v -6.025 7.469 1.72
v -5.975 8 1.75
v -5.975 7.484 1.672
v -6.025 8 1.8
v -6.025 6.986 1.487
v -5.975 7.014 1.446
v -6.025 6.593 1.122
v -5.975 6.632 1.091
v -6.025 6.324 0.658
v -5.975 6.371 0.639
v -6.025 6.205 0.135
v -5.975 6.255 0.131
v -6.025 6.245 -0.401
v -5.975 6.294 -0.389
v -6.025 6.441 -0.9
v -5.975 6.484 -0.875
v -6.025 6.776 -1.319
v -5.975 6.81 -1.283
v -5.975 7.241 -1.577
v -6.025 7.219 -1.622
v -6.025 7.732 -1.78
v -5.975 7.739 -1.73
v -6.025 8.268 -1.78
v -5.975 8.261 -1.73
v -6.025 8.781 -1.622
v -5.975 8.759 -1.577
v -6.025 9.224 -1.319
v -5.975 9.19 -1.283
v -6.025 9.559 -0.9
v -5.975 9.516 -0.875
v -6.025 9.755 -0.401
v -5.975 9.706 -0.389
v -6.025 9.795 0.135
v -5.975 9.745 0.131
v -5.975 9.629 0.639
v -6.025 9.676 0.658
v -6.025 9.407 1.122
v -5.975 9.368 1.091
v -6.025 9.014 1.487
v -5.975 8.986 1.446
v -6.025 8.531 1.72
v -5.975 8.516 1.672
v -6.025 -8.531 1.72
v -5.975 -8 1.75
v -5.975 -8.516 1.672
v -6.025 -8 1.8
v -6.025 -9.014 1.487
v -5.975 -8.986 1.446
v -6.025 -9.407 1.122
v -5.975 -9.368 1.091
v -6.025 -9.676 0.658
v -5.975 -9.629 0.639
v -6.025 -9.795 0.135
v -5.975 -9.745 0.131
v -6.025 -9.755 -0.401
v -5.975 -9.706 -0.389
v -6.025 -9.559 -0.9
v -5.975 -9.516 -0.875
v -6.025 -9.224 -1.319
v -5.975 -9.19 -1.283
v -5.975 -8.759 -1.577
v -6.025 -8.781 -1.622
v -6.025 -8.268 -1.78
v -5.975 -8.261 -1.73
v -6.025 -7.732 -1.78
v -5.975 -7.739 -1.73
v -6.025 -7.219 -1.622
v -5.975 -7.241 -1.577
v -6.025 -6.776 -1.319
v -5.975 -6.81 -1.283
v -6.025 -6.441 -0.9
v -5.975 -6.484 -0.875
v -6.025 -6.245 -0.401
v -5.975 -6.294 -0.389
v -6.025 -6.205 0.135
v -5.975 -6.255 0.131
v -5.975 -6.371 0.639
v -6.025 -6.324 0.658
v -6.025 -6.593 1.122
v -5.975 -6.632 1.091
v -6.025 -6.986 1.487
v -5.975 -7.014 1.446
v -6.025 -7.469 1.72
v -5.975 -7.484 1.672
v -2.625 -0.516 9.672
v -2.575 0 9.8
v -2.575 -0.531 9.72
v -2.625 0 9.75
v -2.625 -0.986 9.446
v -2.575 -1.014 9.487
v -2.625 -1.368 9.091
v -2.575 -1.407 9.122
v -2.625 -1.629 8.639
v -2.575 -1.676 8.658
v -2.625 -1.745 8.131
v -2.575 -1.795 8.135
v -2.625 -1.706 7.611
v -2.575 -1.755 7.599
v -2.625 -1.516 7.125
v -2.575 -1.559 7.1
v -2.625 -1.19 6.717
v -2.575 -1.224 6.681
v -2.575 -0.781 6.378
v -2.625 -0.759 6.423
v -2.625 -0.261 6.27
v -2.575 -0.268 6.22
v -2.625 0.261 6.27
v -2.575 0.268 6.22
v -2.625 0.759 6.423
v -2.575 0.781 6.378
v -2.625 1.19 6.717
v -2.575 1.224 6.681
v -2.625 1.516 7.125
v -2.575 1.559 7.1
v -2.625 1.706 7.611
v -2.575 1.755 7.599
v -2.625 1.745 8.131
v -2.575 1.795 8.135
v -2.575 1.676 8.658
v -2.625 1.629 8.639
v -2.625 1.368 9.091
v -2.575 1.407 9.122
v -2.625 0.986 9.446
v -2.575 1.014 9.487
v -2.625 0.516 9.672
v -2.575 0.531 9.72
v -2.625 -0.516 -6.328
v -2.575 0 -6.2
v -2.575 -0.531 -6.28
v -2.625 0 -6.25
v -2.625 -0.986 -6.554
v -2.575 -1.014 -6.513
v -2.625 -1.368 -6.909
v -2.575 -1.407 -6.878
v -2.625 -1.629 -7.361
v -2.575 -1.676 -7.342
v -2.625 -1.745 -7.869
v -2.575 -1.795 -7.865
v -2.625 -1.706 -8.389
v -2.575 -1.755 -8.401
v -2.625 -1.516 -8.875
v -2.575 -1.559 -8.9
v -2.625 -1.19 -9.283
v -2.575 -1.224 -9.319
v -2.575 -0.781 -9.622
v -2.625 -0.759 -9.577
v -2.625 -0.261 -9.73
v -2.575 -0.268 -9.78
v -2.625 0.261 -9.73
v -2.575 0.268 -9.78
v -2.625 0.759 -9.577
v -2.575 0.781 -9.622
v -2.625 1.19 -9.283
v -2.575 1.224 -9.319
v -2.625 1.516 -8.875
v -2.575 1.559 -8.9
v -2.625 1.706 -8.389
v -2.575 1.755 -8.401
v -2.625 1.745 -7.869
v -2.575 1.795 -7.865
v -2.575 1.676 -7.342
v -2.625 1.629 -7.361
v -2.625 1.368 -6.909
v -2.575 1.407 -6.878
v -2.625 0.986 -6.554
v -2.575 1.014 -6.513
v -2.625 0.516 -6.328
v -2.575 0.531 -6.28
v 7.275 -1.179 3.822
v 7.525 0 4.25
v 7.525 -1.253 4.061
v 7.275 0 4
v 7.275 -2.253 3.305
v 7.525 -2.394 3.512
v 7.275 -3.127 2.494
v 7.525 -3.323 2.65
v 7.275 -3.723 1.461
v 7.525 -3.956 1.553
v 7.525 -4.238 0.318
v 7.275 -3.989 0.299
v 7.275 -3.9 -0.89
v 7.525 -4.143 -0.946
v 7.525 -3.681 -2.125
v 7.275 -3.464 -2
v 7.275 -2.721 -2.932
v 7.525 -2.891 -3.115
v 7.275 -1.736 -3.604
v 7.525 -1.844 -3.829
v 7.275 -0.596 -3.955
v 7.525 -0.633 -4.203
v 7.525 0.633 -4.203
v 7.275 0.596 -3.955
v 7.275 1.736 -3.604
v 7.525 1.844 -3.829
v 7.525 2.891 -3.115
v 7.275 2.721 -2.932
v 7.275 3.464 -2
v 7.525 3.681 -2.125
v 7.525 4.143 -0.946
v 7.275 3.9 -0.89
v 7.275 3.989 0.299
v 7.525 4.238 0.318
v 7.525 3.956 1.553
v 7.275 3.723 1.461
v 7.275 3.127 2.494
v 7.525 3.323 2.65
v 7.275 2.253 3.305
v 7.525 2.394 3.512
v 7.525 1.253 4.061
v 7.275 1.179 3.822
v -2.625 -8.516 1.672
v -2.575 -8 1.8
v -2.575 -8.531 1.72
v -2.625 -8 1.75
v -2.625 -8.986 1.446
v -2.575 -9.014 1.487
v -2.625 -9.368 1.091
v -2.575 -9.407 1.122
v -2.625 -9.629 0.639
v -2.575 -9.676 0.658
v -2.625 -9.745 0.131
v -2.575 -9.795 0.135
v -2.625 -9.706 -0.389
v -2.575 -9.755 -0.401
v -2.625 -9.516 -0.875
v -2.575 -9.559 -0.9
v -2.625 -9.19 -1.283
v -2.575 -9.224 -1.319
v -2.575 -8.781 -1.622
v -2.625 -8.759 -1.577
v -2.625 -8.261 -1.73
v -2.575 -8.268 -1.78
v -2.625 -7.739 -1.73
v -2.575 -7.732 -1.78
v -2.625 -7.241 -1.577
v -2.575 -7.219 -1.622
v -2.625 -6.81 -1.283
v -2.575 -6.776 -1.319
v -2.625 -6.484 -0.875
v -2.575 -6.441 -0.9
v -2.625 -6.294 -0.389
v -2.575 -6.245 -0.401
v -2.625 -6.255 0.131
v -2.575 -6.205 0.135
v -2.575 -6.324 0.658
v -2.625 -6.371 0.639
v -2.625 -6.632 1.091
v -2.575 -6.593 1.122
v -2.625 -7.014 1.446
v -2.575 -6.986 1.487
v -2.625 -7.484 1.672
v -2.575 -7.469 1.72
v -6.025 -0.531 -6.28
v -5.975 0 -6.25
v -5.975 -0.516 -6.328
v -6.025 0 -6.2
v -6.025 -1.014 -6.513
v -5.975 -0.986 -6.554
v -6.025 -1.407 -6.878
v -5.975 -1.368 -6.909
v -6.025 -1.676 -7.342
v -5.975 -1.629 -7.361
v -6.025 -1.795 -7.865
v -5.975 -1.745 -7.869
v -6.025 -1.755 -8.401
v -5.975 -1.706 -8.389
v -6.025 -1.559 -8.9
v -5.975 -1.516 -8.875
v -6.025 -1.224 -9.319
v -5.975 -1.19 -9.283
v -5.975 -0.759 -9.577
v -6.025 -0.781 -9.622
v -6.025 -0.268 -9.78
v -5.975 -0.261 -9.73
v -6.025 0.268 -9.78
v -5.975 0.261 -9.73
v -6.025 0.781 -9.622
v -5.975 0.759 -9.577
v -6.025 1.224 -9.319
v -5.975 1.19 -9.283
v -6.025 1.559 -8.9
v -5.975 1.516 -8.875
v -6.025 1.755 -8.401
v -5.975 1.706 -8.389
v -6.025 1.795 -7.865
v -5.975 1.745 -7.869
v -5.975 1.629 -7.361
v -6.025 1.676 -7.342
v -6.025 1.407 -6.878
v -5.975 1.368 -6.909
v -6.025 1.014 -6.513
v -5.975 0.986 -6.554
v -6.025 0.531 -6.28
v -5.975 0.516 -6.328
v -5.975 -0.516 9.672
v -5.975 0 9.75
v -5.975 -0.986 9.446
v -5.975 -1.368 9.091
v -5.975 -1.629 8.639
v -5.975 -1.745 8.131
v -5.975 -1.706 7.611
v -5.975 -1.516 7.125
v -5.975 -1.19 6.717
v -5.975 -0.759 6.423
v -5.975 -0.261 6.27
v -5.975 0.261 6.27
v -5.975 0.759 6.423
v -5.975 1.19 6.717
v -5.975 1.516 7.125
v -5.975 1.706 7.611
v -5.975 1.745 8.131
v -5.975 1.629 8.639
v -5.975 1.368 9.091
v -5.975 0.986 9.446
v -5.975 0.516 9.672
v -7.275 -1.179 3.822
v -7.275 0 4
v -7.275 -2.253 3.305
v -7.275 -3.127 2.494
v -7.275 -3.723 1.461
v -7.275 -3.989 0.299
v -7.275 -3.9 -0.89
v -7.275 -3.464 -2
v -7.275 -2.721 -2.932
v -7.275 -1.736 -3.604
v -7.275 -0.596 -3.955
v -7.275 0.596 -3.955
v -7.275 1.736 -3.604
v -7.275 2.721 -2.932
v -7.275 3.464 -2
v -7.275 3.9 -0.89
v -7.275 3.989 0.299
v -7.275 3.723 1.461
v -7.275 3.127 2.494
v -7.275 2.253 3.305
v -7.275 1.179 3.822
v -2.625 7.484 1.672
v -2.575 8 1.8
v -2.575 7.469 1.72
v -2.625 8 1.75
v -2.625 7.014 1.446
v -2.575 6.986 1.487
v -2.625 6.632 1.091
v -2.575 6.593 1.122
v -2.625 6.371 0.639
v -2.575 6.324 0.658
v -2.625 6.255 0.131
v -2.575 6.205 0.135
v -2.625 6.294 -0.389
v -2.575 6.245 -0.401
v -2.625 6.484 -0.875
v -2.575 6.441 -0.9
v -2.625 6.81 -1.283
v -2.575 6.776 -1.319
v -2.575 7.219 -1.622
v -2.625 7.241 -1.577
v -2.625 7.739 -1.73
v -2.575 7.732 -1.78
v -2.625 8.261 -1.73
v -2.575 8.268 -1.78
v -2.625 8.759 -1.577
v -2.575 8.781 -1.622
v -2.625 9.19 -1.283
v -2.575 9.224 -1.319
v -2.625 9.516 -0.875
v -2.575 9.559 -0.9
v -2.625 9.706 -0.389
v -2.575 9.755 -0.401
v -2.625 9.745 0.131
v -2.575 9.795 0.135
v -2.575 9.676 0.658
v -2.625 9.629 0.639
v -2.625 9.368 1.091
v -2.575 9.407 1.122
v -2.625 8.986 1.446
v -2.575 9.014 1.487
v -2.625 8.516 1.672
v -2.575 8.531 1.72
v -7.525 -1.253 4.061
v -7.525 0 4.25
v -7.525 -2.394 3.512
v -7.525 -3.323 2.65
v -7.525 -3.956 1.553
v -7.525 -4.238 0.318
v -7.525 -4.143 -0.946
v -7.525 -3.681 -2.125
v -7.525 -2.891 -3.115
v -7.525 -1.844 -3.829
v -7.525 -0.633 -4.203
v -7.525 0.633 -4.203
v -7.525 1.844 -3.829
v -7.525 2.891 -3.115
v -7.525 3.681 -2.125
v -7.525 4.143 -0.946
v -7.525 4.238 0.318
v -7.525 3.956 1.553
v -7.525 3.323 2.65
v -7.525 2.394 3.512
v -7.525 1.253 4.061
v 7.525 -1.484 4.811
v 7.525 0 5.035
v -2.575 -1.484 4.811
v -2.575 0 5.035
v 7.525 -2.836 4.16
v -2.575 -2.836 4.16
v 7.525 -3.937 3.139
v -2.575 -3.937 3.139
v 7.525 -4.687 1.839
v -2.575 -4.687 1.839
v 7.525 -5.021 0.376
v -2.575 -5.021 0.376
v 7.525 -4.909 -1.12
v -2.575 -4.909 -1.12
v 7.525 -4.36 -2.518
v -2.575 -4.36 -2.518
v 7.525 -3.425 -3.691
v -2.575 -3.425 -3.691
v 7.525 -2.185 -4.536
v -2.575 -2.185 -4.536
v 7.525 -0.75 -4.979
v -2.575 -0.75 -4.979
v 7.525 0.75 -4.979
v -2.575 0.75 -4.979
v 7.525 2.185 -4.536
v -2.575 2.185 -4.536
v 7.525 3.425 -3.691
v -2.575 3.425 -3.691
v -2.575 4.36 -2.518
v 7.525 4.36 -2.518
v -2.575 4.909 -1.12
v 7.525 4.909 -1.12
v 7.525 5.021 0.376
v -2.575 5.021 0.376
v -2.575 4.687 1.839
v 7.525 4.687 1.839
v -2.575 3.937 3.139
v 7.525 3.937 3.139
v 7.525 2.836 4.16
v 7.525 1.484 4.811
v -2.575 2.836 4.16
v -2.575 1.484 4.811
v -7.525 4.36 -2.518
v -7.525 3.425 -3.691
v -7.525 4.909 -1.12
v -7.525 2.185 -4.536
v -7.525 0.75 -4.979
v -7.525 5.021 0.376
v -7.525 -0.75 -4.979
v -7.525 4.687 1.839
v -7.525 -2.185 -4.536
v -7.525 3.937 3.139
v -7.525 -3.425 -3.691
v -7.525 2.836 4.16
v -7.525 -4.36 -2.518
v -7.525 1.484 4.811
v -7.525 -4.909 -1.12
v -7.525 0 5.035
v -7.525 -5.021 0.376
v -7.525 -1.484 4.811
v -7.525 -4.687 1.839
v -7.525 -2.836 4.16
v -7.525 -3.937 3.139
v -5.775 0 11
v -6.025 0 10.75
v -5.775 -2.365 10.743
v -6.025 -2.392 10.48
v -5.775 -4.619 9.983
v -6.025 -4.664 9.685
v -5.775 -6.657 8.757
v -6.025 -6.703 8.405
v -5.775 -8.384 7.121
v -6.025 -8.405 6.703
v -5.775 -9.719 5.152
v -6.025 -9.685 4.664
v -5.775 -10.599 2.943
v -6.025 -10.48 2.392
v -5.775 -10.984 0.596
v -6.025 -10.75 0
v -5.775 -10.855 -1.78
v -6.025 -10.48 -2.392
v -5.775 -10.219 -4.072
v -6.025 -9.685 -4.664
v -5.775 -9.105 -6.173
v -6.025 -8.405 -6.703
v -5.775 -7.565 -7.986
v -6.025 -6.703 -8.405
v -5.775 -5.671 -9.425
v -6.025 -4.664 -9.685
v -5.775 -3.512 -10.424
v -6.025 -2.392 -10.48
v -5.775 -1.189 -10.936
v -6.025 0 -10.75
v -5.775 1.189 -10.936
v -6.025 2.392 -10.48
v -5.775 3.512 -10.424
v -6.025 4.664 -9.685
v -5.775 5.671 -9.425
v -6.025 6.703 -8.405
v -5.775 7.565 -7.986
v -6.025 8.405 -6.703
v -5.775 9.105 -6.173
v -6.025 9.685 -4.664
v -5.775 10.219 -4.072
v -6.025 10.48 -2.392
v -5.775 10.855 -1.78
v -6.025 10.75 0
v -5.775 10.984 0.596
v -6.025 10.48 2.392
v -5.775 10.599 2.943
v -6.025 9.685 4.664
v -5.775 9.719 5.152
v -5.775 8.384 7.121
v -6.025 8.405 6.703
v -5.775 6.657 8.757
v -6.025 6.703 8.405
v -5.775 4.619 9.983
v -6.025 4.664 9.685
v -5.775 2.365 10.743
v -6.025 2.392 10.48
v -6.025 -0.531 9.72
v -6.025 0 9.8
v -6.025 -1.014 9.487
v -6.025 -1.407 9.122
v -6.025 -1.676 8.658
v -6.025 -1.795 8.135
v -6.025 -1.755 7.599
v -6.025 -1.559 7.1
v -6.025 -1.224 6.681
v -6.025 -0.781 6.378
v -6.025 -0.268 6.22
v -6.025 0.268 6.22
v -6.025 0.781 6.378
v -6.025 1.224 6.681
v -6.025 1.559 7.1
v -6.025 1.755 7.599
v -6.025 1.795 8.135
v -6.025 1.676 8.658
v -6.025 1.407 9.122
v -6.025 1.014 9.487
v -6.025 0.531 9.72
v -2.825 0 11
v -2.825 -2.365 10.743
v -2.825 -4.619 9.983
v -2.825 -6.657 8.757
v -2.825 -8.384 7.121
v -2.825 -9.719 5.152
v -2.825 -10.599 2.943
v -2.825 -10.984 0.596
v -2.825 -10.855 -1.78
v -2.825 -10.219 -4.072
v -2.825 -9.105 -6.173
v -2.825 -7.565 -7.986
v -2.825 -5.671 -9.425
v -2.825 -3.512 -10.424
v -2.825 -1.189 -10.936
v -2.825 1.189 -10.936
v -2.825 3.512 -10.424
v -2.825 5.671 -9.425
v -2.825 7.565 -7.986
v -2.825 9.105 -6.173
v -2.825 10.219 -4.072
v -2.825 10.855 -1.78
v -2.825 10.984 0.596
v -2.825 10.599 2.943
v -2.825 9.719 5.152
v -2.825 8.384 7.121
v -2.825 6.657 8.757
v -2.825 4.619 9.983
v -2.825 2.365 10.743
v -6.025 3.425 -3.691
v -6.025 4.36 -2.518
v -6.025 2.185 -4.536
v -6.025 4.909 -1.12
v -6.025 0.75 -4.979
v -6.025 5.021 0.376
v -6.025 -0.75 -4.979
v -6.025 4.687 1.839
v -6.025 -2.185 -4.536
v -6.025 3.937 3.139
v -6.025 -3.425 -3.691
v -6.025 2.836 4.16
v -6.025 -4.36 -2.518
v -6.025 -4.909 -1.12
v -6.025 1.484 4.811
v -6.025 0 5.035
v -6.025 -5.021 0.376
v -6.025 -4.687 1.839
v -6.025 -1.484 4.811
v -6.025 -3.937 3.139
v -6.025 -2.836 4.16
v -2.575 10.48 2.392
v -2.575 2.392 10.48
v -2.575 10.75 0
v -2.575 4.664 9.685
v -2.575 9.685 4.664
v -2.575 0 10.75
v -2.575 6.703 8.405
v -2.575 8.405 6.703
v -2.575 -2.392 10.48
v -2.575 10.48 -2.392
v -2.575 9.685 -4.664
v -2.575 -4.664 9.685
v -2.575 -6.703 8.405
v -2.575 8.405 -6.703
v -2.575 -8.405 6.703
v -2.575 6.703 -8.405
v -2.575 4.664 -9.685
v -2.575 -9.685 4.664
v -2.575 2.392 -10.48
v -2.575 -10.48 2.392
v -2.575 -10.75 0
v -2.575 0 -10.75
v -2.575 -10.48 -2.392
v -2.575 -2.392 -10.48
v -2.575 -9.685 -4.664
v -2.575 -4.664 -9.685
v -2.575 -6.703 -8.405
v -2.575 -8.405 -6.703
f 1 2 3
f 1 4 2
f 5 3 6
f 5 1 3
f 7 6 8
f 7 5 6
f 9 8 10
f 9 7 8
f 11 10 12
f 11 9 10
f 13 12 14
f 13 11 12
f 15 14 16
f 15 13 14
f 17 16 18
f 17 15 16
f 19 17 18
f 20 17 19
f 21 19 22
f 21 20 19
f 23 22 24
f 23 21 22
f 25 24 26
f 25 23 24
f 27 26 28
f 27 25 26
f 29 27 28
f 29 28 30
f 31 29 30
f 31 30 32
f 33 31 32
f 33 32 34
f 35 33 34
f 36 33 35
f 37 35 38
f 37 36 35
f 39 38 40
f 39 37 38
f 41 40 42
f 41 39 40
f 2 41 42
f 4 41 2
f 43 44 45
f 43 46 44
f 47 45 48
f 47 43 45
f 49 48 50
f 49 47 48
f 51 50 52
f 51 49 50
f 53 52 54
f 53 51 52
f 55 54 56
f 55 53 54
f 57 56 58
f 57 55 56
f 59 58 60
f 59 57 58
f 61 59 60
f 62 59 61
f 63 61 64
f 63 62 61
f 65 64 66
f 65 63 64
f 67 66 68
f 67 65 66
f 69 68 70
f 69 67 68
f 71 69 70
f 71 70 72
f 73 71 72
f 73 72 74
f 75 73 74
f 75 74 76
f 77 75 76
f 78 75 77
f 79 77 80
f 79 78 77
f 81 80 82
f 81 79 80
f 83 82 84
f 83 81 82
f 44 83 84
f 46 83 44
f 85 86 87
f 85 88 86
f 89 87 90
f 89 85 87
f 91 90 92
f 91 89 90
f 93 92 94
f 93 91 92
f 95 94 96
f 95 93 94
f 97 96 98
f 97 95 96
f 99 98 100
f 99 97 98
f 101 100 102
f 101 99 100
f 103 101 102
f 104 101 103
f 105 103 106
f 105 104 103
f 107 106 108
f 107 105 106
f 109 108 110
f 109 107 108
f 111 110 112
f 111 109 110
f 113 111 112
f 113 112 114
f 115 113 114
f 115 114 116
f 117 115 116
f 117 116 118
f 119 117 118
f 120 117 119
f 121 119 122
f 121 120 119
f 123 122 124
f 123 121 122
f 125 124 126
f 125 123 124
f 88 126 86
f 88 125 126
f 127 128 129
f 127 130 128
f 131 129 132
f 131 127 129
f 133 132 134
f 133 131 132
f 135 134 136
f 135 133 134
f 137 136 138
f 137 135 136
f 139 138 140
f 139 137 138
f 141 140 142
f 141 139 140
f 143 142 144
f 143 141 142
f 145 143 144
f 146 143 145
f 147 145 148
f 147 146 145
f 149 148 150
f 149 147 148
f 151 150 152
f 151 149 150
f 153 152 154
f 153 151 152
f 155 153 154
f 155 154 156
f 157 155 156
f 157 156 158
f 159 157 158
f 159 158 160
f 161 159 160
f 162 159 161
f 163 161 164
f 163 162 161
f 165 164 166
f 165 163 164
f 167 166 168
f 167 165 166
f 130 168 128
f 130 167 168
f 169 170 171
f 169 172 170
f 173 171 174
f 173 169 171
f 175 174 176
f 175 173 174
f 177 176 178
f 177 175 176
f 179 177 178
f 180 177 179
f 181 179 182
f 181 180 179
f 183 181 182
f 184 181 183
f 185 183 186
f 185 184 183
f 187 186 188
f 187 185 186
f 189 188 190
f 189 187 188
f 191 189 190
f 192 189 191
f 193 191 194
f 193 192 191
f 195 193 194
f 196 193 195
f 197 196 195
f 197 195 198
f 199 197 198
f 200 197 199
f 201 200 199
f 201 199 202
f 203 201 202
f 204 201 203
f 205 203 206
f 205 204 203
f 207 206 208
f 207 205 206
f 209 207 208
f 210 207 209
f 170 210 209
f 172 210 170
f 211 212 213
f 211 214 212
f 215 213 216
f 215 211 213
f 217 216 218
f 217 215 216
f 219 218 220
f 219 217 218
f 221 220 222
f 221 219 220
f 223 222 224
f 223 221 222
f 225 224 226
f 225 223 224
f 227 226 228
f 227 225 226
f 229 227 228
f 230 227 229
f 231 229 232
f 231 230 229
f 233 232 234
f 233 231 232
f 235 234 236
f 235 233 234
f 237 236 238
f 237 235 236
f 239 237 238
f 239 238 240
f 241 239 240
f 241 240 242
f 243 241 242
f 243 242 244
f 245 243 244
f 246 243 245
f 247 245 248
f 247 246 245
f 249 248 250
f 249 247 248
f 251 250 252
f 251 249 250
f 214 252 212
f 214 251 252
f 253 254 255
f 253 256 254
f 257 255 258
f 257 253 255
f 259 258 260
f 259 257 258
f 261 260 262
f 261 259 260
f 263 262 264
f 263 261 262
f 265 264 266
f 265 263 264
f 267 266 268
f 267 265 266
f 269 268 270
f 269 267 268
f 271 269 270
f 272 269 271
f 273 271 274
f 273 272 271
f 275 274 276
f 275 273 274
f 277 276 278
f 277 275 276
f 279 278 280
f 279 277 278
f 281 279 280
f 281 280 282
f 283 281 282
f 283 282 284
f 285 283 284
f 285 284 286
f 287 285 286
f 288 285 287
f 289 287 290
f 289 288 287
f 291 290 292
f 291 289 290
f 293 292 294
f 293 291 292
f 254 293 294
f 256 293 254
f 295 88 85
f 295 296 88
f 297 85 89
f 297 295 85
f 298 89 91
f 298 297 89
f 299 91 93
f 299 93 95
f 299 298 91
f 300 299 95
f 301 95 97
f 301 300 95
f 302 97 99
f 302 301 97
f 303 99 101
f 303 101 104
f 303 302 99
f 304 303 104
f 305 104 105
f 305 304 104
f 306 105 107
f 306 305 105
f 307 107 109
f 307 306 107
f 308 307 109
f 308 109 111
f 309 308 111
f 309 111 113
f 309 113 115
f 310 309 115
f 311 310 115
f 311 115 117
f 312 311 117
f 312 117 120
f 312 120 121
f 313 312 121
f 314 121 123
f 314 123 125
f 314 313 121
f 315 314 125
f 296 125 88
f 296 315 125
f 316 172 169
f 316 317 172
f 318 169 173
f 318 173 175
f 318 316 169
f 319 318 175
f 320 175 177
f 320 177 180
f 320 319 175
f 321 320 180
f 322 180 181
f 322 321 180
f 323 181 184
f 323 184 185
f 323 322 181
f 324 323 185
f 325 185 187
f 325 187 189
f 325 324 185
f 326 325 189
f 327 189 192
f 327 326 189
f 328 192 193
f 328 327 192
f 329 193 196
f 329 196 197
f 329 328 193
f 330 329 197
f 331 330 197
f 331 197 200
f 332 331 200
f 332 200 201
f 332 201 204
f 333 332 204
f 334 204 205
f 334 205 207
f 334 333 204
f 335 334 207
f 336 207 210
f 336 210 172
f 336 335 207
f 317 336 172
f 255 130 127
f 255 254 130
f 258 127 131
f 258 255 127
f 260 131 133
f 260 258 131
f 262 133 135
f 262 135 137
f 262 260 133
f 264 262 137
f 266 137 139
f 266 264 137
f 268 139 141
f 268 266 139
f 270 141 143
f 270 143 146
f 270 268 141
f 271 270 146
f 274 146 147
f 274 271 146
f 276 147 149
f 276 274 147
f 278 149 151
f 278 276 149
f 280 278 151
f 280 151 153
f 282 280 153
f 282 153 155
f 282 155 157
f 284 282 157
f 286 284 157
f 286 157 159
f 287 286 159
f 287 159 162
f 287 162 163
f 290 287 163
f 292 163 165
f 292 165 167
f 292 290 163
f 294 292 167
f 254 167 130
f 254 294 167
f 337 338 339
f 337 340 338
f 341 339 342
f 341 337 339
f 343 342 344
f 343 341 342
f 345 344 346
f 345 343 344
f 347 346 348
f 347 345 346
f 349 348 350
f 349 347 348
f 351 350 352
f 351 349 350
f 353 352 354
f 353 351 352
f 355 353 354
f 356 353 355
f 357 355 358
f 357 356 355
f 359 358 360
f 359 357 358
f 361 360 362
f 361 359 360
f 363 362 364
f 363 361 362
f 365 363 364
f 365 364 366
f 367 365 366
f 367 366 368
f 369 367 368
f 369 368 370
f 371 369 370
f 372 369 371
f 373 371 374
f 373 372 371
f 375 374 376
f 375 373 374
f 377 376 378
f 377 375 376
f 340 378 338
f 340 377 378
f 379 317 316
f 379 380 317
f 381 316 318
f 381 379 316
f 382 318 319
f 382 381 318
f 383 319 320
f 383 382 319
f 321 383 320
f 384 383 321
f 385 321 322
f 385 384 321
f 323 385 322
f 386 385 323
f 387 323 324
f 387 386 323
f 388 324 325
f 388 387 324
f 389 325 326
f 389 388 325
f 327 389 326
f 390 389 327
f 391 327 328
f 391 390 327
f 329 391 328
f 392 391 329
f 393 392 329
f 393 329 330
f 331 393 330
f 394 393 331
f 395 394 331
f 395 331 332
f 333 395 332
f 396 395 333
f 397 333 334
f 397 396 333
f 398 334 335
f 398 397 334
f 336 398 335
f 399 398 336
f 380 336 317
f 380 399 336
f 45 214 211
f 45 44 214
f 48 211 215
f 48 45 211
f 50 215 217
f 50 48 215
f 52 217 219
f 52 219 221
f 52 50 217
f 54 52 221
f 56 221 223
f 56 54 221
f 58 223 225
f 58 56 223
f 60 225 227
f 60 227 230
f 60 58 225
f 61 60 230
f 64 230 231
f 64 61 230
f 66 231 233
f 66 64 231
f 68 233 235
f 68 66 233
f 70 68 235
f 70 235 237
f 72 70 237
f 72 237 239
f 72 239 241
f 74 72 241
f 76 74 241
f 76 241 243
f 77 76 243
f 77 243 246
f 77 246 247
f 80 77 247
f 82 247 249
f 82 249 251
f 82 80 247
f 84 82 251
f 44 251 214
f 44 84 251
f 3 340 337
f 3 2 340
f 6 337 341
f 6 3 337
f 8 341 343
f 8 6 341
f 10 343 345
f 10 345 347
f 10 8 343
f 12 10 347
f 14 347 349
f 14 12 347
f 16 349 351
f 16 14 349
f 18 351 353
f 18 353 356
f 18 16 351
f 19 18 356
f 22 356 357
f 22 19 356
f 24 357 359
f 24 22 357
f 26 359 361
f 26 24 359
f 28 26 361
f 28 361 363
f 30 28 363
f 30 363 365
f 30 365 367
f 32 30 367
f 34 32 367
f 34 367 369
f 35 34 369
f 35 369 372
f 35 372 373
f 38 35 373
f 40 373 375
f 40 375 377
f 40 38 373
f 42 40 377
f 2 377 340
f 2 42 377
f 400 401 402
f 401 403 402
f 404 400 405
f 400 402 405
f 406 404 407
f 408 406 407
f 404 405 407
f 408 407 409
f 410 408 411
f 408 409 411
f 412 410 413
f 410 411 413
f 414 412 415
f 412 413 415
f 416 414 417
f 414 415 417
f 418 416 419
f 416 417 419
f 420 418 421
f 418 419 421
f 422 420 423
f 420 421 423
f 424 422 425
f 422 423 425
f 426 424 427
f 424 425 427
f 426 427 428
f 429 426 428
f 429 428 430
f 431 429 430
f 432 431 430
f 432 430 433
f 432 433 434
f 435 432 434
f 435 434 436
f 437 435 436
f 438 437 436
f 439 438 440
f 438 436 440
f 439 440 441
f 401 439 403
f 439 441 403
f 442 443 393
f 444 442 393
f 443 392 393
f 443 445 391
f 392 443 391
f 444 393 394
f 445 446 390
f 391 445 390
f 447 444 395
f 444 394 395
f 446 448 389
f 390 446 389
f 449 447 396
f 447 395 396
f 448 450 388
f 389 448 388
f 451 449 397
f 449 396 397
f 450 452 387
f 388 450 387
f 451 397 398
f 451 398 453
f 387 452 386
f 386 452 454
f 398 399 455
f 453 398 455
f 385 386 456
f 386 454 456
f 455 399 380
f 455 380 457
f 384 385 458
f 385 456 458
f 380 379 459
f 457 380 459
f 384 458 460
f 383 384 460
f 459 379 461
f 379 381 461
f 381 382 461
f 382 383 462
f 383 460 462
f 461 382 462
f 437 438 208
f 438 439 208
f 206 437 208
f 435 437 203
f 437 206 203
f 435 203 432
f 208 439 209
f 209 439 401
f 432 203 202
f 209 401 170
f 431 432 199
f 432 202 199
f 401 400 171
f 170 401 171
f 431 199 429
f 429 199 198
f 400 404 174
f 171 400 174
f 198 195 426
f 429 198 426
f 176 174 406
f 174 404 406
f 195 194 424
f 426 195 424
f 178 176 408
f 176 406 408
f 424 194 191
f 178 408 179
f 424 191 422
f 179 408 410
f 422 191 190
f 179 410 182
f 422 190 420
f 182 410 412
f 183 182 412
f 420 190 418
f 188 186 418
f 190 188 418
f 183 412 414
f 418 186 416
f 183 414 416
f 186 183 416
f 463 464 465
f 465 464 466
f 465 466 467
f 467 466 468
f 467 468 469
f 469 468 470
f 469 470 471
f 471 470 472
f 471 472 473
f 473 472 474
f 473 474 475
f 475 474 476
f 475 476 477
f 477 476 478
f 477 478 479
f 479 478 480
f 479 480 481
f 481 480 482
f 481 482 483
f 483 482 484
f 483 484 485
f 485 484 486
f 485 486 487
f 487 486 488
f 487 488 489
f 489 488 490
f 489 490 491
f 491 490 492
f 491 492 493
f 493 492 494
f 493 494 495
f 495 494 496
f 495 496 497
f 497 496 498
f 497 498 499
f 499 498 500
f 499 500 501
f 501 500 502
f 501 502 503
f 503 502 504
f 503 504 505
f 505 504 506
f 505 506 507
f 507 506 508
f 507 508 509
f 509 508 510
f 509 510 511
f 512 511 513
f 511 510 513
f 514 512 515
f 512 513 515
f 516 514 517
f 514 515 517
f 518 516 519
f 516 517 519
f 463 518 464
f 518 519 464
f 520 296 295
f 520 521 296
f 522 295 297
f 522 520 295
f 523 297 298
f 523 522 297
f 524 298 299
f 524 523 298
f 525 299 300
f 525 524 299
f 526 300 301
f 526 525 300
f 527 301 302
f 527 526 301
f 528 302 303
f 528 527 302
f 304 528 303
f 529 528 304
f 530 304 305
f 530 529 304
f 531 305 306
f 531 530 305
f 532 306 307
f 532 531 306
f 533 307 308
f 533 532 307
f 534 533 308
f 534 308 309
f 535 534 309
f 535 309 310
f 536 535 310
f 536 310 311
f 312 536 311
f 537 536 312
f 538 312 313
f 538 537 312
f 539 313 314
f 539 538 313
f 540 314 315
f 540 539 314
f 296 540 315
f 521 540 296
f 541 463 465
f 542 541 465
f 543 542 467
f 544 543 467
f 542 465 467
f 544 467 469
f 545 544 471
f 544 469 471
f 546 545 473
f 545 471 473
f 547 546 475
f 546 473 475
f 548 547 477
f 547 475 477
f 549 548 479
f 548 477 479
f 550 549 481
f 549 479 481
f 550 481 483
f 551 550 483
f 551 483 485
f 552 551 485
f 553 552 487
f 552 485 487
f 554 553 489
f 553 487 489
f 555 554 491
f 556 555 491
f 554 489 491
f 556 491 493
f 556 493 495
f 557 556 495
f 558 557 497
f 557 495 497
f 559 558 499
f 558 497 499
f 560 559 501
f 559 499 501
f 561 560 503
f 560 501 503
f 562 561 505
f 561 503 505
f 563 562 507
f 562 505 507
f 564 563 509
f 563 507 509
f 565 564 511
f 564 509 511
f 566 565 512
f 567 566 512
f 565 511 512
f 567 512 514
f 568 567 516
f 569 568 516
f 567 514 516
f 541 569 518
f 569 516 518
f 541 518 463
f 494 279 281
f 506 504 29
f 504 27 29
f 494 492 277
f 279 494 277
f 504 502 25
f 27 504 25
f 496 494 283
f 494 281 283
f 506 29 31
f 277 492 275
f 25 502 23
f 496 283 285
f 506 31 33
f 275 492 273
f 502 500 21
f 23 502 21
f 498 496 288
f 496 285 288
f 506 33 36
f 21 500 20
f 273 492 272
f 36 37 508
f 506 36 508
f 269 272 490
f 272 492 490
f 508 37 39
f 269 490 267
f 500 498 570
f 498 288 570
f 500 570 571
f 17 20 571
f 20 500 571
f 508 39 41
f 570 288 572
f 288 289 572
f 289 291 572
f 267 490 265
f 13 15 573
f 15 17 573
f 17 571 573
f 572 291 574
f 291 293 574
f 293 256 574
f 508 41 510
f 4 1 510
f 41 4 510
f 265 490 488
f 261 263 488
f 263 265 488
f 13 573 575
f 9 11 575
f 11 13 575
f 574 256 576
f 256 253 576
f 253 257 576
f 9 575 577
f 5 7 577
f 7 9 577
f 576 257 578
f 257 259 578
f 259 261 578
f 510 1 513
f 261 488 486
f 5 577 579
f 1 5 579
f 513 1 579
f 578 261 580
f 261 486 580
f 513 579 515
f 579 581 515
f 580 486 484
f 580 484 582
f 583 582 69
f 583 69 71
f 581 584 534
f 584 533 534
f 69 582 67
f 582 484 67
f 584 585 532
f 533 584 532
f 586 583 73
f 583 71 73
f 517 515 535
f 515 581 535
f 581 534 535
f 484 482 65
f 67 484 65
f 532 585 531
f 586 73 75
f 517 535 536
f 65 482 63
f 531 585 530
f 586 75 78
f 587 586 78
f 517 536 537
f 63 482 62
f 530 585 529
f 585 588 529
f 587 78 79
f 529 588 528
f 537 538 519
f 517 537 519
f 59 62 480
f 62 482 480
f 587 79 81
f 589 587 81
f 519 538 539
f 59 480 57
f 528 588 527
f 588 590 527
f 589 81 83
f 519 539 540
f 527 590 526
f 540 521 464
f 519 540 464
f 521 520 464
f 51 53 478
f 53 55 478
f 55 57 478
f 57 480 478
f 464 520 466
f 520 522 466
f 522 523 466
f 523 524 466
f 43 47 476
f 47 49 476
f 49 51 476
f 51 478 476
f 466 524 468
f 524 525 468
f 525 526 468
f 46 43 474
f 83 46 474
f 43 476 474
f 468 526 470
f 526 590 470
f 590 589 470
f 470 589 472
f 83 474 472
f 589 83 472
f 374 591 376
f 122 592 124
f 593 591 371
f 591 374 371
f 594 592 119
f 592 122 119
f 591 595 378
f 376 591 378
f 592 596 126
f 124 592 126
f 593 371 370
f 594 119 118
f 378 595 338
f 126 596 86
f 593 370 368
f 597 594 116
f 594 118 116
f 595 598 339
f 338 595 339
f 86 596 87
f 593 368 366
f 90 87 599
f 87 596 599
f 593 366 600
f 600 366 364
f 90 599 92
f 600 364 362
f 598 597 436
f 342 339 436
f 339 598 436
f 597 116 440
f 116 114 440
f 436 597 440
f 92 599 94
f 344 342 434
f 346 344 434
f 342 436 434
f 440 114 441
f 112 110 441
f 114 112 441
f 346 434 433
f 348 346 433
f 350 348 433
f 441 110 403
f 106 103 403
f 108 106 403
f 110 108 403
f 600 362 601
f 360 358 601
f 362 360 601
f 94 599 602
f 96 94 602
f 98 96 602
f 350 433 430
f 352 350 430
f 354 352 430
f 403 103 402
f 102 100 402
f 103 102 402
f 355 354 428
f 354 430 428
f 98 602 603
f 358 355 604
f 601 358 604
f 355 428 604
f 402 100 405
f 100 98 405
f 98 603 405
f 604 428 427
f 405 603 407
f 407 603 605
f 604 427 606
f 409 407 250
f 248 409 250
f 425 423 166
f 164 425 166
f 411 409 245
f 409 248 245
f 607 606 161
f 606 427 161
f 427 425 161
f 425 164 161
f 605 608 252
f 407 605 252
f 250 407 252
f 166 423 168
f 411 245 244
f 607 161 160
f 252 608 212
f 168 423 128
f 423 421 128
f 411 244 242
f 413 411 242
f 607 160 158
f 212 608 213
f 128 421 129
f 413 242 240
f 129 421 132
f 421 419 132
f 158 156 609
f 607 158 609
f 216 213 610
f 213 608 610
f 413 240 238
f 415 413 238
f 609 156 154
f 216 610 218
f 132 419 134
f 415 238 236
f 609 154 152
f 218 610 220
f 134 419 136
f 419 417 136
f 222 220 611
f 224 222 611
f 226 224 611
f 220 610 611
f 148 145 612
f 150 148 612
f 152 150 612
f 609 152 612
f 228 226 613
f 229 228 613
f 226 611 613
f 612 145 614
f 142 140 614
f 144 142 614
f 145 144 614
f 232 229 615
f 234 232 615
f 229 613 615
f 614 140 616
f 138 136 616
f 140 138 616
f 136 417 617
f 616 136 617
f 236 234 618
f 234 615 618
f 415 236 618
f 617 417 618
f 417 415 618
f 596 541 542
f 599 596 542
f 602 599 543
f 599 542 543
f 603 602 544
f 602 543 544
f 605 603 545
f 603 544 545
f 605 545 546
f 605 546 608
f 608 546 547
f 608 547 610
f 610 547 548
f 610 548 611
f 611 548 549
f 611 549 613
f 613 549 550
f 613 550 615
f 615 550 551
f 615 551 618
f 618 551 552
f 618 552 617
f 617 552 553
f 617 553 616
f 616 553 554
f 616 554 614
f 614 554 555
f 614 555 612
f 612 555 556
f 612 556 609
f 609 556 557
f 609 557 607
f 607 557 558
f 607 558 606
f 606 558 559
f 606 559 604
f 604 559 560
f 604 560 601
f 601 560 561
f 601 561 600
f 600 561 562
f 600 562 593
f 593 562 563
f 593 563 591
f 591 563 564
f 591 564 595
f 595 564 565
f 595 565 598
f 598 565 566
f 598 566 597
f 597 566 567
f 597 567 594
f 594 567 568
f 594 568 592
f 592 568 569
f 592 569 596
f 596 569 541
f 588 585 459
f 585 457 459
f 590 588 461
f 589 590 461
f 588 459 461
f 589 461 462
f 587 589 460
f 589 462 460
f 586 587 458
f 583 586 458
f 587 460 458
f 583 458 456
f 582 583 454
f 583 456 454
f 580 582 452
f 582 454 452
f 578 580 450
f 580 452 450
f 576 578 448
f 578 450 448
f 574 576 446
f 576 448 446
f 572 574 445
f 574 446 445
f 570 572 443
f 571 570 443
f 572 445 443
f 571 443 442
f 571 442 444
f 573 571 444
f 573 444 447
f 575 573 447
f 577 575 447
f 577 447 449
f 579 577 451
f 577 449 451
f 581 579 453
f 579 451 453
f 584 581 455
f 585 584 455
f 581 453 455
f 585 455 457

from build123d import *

# Parameters (mm, degrees)
F_3_5_3_5_DIAMETER_HOLE1_AT_2_COUNT = 2
F_3_5_3_5_DIAMETER_HOLE1_AT_2_PITCH = 11.313708499
F_3_5_3_5_DIAMETER_HOLE1_AT_3_COUNT = 2
F_3_5_3_5_DIAMETER_HOLE1_AT_3_PITCH = 16
F_3_5_3_5_DIAMETER_HOLE1_AT_4_COUNT = 2
F_3_5_3_5_DIAMETER_HOLE1_AT_4_PITCH = 11.313708499
CHAMFER1_SIZE                       = 0.25


with BuildPart() as part:
    # Sketch1 → Revolve1 (revolve)
    with BuildSketch(Plane.XY, mode=Mode.PRIVATE) as revolve1_sk:
        Polygon((7.525, 0), (7.525, 5.035), (-2.575, 5.035), (-2.575, 11), (-6.025, 11), (-6.025, 5.035), (-7.525, 5.035), (-7.525, 0), align=None)
    revolve(revolve1_sk.sketch.rotate(Axis((-7.525, 0, 0), (1, 0, 0)), 90), axis=Axis((-7.525, 0, 0), (1, 0, 0)))

    # Sketch3 → Ø8.0 (8) Diameter Hole1 (revolve, cut)
    with BuildSketch(Plane(origin=(-7.525, 0, 0), x_dir=(0, 0, 1), z_dir=(0, 1, 0))):
        Polygon((0, 0), (0, 15.05), (4.25, 15.05), (4, 14.8), (4, 0.25), (4.25, 0), align=None)
    revolve(axis=Axis((-13.875, 0, 0), (1, 0, 0)), mode=Mode.SUBTRACT)

    # Sketch7 → Ø3.5 (3.5) Diameter Hole1 (revolve, cut)
    with BuildSketch(Plane(origin=(-6.025, 8, 0), x_dir=(0, 0, 1), z_dir=(0, 1, 0))):
        Polygon((0, 0), (0, 3.45), (1.8, 3.45), (1.75, 3.4), (1.75, 0.05), (1.8, 0), align=None)
    f_3_5_3_5_diameter_hole1 = revolve(axis=Axis((-12.375, 8, 0), (1, 0, 0)), mode=Mode.SUBTRACT)

    # Ø3.5 (3.5) Diameter Hole1 at 2: Ø3.5 (3.5) Diameter Hole1 ×2
    with Locations(*[Vector(0, -0.7071067811865476, 0.7071067811865476) * (i * F_3_5_3_5_DIAMETER_HOLE1_AT_2_PITCH) for i in range(1, F_3_5_3_5_DIAMETER_HOLE1_AT_2_COUNT)]):
        add(f_3_5_3_5_diameter_hole1, mode=Mode.SUBTRACT)

    # Ø3.5 (3.5) Diameter Hole1 at 3: Ø3.5 (3.5) Diameter Hole1 ×2
    with Locations(*[(0, -i * F_3_5_3_5_DIAMETER_HOLE1_AT_3_PITCH, 0) for i in range(1, F_3_5_3_5_DIAMETER_HOLE1_AT_3_COUNT)]):
        add(f_3_5_3_5_diameter_hole1, mode=Mode.SUBTRACT)

    # Ø3.5 (3.5) Diameter Hole1 at 4: Ø3.5 (3.5) Diameter Hole1 ×2
    with Locations(*[Vector(0, -0.7071067811865476, -0.7071067811865476) * (i * F_3_5_3_5_DIAMETER_HOLE1_AT_4_PITCH) for i in range(1, F_3_5_3_5_DIAMETER_HOLE1_AT_4_COUNT)]):
        add(f_3_5_3_5_diameter_hole1, mode=Mode.SUBTRACT)

    # Chamfer1
    chamfer1_edges = [part.edges().sort_by_distance(p)[0] for p in [
        (-6.025, 0, -11),
        (-2.575, 0, -11),
    ]]
    chamfer(chamfer1_edges, length=CHAMFER1_SIZE)


solid = part.part
